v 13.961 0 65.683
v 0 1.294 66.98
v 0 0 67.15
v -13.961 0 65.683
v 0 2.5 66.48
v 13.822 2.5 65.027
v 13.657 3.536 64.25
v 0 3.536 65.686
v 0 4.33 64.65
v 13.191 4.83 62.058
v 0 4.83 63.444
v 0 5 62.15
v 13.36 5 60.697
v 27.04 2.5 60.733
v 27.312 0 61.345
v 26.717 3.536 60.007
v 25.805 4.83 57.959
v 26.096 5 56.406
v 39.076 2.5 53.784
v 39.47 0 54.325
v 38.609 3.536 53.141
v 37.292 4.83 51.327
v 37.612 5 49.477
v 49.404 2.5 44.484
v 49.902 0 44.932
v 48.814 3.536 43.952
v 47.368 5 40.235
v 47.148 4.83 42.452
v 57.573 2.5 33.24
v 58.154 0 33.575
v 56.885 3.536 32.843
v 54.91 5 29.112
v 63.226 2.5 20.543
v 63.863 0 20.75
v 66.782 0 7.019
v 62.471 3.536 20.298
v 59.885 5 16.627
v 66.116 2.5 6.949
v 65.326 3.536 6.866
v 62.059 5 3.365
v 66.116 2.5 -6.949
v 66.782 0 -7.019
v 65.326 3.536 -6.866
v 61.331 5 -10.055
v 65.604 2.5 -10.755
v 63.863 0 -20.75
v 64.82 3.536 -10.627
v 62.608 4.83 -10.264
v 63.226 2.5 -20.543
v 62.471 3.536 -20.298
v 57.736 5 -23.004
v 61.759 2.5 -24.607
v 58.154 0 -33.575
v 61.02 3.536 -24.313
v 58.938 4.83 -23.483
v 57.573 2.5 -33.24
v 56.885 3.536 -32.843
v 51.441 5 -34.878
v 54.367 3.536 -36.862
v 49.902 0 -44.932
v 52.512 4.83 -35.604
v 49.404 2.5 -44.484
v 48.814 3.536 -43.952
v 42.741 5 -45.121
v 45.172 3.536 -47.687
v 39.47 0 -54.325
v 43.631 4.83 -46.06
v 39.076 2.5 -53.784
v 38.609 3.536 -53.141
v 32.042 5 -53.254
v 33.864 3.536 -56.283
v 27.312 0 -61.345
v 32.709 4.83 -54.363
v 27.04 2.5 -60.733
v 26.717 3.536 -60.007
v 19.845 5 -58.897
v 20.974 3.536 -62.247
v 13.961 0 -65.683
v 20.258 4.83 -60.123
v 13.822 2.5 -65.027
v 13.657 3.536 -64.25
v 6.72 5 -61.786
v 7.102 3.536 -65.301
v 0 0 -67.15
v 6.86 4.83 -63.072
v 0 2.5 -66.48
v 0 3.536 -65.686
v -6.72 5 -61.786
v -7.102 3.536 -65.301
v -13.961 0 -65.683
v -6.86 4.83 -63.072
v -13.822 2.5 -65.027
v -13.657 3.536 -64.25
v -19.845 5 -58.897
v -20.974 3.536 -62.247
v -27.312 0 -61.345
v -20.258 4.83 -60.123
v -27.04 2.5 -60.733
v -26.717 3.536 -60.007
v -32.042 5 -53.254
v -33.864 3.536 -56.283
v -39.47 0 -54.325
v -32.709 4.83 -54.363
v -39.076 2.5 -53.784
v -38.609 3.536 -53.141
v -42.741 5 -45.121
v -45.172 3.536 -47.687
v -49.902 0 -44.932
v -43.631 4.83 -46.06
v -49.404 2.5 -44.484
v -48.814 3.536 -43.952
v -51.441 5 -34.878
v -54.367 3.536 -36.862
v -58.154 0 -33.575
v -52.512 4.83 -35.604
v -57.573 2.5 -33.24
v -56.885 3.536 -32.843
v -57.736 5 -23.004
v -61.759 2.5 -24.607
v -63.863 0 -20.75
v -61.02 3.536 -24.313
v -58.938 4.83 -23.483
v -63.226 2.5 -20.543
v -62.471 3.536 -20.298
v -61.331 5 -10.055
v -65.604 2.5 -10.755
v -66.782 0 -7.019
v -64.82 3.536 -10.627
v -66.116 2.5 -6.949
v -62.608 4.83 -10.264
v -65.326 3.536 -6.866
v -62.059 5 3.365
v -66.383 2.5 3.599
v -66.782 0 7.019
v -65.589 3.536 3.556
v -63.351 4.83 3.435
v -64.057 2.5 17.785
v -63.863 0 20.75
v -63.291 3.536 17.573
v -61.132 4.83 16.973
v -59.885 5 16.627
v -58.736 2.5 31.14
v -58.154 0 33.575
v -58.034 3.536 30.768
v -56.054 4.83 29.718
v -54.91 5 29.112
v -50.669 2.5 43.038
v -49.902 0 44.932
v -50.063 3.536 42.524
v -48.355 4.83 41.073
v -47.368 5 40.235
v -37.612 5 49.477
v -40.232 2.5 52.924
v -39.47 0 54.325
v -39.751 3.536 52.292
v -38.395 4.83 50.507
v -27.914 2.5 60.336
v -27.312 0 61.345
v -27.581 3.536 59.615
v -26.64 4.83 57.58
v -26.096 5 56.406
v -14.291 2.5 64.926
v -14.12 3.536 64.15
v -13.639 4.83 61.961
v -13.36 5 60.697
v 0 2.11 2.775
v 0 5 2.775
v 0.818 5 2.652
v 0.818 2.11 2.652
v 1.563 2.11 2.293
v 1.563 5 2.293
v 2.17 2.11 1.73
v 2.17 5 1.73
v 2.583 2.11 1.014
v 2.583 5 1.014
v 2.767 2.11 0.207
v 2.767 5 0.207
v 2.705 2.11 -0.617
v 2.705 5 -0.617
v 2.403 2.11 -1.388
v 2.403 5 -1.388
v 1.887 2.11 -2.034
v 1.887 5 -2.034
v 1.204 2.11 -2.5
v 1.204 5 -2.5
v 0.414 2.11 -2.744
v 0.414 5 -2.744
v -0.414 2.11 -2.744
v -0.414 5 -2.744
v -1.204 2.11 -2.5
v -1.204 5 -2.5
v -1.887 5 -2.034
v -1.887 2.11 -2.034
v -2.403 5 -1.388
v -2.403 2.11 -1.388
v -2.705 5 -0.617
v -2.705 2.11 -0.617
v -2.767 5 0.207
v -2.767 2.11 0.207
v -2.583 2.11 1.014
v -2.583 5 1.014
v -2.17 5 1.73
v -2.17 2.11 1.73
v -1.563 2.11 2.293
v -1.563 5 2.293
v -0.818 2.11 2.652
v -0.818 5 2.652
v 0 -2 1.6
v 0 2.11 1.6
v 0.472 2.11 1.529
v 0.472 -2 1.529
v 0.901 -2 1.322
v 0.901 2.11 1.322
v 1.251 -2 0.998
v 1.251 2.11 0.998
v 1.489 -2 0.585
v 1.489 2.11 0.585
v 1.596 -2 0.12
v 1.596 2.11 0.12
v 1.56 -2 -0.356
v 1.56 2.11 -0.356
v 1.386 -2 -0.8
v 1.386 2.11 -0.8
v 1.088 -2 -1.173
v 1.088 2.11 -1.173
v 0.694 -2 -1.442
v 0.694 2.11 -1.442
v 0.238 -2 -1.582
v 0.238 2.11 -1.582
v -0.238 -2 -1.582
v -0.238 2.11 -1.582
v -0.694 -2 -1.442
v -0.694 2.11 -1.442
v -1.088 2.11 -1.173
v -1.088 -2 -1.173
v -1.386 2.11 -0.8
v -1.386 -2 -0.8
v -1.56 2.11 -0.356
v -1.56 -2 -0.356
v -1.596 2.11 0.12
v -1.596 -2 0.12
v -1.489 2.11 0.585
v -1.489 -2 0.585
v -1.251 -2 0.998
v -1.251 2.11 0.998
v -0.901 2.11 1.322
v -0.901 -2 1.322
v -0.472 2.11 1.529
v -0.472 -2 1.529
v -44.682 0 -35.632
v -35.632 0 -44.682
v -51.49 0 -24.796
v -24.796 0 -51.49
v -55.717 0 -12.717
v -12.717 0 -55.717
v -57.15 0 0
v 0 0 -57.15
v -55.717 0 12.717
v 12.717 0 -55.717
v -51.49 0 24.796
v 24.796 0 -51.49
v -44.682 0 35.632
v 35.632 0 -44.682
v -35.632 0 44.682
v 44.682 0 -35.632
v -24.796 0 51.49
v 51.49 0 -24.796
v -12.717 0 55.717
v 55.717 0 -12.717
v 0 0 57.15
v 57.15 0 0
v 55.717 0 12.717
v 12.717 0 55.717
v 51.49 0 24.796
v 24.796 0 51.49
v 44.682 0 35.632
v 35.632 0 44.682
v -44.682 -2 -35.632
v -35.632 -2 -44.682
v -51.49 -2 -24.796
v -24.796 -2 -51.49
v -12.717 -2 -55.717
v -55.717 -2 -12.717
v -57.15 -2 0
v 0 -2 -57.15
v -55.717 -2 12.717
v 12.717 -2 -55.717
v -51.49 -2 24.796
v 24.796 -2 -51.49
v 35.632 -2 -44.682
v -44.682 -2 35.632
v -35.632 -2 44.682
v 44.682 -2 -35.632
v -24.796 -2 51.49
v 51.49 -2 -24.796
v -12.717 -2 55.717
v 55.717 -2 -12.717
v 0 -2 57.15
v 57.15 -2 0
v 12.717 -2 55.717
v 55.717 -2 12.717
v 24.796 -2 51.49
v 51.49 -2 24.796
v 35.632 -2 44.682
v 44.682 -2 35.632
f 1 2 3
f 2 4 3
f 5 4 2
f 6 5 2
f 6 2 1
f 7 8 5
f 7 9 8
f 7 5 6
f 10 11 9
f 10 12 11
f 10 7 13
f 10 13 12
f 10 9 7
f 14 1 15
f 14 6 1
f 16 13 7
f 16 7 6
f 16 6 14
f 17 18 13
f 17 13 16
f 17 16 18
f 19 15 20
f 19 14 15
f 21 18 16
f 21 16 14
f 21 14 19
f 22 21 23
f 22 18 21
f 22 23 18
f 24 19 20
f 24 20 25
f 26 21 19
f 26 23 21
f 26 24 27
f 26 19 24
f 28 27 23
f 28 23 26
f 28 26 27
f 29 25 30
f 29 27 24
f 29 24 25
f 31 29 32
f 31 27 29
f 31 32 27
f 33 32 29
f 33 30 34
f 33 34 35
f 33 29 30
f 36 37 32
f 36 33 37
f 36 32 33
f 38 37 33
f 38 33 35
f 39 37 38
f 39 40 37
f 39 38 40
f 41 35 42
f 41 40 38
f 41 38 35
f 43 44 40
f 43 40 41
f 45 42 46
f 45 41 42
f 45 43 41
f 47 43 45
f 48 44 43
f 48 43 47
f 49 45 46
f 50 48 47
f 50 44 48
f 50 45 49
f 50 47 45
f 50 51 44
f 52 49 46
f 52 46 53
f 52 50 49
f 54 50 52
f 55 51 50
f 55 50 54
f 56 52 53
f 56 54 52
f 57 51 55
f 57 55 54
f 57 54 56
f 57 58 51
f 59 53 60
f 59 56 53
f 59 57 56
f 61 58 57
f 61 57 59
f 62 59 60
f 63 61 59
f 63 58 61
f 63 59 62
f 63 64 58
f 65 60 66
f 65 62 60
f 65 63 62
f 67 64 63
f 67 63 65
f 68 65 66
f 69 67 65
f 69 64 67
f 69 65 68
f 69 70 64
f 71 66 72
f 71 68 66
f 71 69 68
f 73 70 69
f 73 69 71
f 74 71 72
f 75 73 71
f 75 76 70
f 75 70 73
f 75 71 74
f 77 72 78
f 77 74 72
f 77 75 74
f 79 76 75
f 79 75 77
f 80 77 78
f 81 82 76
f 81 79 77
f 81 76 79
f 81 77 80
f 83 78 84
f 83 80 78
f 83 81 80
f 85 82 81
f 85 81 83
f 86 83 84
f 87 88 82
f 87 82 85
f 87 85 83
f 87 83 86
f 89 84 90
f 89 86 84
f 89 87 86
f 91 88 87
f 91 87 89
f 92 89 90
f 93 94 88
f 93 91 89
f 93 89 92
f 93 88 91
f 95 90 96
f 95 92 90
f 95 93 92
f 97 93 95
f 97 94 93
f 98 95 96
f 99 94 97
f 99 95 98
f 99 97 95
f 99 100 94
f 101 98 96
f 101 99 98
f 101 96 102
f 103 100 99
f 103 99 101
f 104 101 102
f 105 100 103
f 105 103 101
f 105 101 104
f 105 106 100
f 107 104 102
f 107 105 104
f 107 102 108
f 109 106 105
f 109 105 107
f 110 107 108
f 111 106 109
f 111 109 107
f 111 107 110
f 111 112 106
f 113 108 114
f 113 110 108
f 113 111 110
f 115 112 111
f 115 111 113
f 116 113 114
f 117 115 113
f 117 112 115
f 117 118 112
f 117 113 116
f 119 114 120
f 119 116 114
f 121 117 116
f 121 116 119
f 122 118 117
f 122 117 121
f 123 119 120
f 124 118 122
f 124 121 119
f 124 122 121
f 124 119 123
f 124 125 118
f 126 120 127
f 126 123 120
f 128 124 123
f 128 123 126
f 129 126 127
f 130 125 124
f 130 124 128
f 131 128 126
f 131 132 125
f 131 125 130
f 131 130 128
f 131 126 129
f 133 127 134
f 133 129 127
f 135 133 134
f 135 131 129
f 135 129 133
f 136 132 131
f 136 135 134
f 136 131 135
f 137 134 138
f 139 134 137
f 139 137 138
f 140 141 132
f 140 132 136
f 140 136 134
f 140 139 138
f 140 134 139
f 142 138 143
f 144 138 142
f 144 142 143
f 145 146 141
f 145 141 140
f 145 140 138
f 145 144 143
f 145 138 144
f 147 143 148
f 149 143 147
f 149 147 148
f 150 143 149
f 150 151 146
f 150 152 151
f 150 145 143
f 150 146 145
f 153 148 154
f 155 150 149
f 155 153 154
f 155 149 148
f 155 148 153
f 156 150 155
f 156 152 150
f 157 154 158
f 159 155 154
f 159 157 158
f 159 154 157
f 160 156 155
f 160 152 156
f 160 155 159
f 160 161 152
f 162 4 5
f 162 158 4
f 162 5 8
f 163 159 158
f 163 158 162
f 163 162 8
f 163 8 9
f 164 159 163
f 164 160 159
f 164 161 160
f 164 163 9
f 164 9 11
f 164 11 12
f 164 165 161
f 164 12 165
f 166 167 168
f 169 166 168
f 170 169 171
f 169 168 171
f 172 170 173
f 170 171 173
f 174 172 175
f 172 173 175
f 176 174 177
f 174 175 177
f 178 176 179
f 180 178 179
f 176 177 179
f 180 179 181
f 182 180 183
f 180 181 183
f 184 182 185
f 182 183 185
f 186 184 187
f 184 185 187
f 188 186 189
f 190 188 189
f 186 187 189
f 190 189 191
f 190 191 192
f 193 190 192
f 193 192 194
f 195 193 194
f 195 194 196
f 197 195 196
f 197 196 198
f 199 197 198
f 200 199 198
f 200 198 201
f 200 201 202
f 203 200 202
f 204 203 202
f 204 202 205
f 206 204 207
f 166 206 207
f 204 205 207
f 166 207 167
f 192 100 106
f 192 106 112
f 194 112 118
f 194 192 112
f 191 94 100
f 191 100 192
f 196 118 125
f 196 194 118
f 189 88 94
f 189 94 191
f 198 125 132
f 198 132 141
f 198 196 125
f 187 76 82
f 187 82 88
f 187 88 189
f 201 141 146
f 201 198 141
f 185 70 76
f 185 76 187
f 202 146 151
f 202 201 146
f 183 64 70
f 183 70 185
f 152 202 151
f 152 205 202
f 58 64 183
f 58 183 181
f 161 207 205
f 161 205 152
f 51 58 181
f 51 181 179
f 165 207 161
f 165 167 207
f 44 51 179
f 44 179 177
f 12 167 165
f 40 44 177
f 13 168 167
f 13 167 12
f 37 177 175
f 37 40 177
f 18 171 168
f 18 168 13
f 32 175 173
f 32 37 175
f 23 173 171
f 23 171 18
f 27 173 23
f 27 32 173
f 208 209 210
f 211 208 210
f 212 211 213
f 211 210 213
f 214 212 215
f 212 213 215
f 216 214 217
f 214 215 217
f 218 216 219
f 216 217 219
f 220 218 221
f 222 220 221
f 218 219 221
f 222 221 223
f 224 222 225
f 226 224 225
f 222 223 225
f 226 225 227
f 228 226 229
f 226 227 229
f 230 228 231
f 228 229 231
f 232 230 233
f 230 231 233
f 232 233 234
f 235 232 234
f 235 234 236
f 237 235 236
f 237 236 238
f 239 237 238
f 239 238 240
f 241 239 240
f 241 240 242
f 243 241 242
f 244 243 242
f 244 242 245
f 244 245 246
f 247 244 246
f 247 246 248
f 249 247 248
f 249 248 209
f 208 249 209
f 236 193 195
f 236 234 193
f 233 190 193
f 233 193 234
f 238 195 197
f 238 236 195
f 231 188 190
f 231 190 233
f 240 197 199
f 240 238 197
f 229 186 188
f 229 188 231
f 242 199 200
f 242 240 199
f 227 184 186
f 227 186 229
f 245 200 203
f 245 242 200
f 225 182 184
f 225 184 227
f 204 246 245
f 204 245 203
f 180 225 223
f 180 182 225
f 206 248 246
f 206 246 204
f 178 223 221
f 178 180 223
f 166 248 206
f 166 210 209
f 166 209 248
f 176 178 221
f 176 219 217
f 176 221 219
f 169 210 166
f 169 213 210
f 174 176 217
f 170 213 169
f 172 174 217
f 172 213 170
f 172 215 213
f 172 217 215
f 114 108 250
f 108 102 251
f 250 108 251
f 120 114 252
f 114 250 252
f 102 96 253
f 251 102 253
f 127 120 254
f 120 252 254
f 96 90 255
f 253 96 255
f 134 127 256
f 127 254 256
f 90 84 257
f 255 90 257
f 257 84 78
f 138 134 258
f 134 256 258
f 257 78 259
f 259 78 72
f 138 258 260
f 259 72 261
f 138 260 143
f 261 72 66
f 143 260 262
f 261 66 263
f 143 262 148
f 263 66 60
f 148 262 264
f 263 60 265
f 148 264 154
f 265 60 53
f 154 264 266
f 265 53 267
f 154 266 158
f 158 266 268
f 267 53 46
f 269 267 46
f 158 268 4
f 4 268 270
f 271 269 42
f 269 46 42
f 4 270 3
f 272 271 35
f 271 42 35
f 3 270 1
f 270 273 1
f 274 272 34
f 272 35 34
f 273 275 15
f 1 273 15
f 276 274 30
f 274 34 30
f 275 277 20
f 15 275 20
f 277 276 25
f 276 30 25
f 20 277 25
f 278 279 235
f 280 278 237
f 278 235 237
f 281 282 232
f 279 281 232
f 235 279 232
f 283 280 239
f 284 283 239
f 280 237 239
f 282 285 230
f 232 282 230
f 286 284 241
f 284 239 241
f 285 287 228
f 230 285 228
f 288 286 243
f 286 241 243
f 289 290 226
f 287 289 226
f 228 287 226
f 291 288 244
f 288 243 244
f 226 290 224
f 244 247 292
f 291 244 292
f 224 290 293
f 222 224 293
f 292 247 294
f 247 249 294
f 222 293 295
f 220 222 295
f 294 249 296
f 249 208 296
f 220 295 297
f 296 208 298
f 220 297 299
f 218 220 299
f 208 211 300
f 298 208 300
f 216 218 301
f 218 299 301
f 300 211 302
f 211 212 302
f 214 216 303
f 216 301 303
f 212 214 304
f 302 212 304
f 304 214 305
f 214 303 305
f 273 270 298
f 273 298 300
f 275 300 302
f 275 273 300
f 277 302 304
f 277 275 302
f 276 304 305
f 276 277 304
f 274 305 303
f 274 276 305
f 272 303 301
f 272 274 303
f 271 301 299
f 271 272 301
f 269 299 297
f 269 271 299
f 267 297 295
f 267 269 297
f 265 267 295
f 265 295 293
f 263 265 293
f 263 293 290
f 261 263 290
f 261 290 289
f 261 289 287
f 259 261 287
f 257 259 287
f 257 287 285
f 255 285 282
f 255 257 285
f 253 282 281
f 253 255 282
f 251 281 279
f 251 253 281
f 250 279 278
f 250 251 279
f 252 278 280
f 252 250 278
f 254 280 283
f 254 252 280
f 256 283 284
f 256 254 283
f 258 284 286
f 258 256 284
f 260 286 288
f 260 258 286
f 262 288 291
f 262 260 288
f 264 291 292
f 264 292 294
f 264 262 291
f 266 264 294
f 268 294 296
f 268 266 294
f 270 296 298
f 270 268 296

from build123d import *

# Parameters (mm, degrees)
SKETCH1_R           = 67.15
BOSS_EXTRUDE1_DEPTH = 5
SKETCH1_3_R         = 57.15
BOSS_EXTRUDE2_DEPTH = 2
SKETCH2_R           = 2.775
CUT_EXTRUDE1_DEPTH  = 2.89
CUT_EXTRUDE2_REACH  = 97.053
SKETCH3_R           = 1.6
FILLET1_R           = 5


with BuildPart() as part:
    # Sketch1 → Boss-Extrude1 (new body)
    with BuildSketch(Plane(origin=(0, 0, 0), x_dir=(1, 0, 0), z_dir=(0, 1, 0))):
        with Locations(Location((0, 0, 0), (0, 0, 270))):
            Circle(SKETCH1_R)
    extrude(amount=BOSS_EXTRUDE1_DEPTH)

    # Sketch1<3> → Boss-Extrude2 (add)
    with BuildSketch(Plane(origin=(0, 0, 0), x_dir=(1, 0, 0), z_dir=(0, 1, 0))):
        with Locations(Location((0, 0, 0), (0, 0, 270))):
            Circle(SKETCH1_3_R)
    extrude(amount=-BOSS_EXTRUDE2_DEPTH)

    # Sketch2 → Cut-Extrude1 (cut)
    with BuildSketch(Plane(origin=(0, 5, 0), x_dir=(1, 0, 0), z_dir=(0, 1, 0))):
        with Locations(Location((0, 0, 0), (0, 0, 270))):
            Circle(SKETCH2_R)
    extrude(amount=-CUT_EXTRUDE1_DEPTH, mode=Mode.SUBTRACT)

    # Sketch3 → Cut-Extrude2 (cut, up to next)
    with BuildSketch(Plane(origin=(0, 2.11, 0), x_dir=(1, 0, 0), z_dir=(0, 1, 0)), mode=Mode.PRIVATE) as cut_extrude2_sk1:
        with Locations(Location((0, 0, 0), (0, 0, 270))):
            Circle(SKETCH3_R)
    cut_extrude2_tool1 = extrude(cut_extrude2_sk1.sketch, amount=-CUT_EXTRUDE2_REACH, mode=Mode.PRIVATE) & part.part
    add(cut_extrude2_tool1.solids().sort_by_distance((0, 2.11, 0))[0], mode=Mode.SUBTRACT)

    # Fillet1
    fillet1_edges = [part.edges().sort_by_distance(p)[0] for p in [
        (0, 5, -67.15),
    ]]
    fillet(fillet1_edges, radius=FILLET1_R - 0.0001)  # a hair under: the kernel refuses the full size


solid = part.part
